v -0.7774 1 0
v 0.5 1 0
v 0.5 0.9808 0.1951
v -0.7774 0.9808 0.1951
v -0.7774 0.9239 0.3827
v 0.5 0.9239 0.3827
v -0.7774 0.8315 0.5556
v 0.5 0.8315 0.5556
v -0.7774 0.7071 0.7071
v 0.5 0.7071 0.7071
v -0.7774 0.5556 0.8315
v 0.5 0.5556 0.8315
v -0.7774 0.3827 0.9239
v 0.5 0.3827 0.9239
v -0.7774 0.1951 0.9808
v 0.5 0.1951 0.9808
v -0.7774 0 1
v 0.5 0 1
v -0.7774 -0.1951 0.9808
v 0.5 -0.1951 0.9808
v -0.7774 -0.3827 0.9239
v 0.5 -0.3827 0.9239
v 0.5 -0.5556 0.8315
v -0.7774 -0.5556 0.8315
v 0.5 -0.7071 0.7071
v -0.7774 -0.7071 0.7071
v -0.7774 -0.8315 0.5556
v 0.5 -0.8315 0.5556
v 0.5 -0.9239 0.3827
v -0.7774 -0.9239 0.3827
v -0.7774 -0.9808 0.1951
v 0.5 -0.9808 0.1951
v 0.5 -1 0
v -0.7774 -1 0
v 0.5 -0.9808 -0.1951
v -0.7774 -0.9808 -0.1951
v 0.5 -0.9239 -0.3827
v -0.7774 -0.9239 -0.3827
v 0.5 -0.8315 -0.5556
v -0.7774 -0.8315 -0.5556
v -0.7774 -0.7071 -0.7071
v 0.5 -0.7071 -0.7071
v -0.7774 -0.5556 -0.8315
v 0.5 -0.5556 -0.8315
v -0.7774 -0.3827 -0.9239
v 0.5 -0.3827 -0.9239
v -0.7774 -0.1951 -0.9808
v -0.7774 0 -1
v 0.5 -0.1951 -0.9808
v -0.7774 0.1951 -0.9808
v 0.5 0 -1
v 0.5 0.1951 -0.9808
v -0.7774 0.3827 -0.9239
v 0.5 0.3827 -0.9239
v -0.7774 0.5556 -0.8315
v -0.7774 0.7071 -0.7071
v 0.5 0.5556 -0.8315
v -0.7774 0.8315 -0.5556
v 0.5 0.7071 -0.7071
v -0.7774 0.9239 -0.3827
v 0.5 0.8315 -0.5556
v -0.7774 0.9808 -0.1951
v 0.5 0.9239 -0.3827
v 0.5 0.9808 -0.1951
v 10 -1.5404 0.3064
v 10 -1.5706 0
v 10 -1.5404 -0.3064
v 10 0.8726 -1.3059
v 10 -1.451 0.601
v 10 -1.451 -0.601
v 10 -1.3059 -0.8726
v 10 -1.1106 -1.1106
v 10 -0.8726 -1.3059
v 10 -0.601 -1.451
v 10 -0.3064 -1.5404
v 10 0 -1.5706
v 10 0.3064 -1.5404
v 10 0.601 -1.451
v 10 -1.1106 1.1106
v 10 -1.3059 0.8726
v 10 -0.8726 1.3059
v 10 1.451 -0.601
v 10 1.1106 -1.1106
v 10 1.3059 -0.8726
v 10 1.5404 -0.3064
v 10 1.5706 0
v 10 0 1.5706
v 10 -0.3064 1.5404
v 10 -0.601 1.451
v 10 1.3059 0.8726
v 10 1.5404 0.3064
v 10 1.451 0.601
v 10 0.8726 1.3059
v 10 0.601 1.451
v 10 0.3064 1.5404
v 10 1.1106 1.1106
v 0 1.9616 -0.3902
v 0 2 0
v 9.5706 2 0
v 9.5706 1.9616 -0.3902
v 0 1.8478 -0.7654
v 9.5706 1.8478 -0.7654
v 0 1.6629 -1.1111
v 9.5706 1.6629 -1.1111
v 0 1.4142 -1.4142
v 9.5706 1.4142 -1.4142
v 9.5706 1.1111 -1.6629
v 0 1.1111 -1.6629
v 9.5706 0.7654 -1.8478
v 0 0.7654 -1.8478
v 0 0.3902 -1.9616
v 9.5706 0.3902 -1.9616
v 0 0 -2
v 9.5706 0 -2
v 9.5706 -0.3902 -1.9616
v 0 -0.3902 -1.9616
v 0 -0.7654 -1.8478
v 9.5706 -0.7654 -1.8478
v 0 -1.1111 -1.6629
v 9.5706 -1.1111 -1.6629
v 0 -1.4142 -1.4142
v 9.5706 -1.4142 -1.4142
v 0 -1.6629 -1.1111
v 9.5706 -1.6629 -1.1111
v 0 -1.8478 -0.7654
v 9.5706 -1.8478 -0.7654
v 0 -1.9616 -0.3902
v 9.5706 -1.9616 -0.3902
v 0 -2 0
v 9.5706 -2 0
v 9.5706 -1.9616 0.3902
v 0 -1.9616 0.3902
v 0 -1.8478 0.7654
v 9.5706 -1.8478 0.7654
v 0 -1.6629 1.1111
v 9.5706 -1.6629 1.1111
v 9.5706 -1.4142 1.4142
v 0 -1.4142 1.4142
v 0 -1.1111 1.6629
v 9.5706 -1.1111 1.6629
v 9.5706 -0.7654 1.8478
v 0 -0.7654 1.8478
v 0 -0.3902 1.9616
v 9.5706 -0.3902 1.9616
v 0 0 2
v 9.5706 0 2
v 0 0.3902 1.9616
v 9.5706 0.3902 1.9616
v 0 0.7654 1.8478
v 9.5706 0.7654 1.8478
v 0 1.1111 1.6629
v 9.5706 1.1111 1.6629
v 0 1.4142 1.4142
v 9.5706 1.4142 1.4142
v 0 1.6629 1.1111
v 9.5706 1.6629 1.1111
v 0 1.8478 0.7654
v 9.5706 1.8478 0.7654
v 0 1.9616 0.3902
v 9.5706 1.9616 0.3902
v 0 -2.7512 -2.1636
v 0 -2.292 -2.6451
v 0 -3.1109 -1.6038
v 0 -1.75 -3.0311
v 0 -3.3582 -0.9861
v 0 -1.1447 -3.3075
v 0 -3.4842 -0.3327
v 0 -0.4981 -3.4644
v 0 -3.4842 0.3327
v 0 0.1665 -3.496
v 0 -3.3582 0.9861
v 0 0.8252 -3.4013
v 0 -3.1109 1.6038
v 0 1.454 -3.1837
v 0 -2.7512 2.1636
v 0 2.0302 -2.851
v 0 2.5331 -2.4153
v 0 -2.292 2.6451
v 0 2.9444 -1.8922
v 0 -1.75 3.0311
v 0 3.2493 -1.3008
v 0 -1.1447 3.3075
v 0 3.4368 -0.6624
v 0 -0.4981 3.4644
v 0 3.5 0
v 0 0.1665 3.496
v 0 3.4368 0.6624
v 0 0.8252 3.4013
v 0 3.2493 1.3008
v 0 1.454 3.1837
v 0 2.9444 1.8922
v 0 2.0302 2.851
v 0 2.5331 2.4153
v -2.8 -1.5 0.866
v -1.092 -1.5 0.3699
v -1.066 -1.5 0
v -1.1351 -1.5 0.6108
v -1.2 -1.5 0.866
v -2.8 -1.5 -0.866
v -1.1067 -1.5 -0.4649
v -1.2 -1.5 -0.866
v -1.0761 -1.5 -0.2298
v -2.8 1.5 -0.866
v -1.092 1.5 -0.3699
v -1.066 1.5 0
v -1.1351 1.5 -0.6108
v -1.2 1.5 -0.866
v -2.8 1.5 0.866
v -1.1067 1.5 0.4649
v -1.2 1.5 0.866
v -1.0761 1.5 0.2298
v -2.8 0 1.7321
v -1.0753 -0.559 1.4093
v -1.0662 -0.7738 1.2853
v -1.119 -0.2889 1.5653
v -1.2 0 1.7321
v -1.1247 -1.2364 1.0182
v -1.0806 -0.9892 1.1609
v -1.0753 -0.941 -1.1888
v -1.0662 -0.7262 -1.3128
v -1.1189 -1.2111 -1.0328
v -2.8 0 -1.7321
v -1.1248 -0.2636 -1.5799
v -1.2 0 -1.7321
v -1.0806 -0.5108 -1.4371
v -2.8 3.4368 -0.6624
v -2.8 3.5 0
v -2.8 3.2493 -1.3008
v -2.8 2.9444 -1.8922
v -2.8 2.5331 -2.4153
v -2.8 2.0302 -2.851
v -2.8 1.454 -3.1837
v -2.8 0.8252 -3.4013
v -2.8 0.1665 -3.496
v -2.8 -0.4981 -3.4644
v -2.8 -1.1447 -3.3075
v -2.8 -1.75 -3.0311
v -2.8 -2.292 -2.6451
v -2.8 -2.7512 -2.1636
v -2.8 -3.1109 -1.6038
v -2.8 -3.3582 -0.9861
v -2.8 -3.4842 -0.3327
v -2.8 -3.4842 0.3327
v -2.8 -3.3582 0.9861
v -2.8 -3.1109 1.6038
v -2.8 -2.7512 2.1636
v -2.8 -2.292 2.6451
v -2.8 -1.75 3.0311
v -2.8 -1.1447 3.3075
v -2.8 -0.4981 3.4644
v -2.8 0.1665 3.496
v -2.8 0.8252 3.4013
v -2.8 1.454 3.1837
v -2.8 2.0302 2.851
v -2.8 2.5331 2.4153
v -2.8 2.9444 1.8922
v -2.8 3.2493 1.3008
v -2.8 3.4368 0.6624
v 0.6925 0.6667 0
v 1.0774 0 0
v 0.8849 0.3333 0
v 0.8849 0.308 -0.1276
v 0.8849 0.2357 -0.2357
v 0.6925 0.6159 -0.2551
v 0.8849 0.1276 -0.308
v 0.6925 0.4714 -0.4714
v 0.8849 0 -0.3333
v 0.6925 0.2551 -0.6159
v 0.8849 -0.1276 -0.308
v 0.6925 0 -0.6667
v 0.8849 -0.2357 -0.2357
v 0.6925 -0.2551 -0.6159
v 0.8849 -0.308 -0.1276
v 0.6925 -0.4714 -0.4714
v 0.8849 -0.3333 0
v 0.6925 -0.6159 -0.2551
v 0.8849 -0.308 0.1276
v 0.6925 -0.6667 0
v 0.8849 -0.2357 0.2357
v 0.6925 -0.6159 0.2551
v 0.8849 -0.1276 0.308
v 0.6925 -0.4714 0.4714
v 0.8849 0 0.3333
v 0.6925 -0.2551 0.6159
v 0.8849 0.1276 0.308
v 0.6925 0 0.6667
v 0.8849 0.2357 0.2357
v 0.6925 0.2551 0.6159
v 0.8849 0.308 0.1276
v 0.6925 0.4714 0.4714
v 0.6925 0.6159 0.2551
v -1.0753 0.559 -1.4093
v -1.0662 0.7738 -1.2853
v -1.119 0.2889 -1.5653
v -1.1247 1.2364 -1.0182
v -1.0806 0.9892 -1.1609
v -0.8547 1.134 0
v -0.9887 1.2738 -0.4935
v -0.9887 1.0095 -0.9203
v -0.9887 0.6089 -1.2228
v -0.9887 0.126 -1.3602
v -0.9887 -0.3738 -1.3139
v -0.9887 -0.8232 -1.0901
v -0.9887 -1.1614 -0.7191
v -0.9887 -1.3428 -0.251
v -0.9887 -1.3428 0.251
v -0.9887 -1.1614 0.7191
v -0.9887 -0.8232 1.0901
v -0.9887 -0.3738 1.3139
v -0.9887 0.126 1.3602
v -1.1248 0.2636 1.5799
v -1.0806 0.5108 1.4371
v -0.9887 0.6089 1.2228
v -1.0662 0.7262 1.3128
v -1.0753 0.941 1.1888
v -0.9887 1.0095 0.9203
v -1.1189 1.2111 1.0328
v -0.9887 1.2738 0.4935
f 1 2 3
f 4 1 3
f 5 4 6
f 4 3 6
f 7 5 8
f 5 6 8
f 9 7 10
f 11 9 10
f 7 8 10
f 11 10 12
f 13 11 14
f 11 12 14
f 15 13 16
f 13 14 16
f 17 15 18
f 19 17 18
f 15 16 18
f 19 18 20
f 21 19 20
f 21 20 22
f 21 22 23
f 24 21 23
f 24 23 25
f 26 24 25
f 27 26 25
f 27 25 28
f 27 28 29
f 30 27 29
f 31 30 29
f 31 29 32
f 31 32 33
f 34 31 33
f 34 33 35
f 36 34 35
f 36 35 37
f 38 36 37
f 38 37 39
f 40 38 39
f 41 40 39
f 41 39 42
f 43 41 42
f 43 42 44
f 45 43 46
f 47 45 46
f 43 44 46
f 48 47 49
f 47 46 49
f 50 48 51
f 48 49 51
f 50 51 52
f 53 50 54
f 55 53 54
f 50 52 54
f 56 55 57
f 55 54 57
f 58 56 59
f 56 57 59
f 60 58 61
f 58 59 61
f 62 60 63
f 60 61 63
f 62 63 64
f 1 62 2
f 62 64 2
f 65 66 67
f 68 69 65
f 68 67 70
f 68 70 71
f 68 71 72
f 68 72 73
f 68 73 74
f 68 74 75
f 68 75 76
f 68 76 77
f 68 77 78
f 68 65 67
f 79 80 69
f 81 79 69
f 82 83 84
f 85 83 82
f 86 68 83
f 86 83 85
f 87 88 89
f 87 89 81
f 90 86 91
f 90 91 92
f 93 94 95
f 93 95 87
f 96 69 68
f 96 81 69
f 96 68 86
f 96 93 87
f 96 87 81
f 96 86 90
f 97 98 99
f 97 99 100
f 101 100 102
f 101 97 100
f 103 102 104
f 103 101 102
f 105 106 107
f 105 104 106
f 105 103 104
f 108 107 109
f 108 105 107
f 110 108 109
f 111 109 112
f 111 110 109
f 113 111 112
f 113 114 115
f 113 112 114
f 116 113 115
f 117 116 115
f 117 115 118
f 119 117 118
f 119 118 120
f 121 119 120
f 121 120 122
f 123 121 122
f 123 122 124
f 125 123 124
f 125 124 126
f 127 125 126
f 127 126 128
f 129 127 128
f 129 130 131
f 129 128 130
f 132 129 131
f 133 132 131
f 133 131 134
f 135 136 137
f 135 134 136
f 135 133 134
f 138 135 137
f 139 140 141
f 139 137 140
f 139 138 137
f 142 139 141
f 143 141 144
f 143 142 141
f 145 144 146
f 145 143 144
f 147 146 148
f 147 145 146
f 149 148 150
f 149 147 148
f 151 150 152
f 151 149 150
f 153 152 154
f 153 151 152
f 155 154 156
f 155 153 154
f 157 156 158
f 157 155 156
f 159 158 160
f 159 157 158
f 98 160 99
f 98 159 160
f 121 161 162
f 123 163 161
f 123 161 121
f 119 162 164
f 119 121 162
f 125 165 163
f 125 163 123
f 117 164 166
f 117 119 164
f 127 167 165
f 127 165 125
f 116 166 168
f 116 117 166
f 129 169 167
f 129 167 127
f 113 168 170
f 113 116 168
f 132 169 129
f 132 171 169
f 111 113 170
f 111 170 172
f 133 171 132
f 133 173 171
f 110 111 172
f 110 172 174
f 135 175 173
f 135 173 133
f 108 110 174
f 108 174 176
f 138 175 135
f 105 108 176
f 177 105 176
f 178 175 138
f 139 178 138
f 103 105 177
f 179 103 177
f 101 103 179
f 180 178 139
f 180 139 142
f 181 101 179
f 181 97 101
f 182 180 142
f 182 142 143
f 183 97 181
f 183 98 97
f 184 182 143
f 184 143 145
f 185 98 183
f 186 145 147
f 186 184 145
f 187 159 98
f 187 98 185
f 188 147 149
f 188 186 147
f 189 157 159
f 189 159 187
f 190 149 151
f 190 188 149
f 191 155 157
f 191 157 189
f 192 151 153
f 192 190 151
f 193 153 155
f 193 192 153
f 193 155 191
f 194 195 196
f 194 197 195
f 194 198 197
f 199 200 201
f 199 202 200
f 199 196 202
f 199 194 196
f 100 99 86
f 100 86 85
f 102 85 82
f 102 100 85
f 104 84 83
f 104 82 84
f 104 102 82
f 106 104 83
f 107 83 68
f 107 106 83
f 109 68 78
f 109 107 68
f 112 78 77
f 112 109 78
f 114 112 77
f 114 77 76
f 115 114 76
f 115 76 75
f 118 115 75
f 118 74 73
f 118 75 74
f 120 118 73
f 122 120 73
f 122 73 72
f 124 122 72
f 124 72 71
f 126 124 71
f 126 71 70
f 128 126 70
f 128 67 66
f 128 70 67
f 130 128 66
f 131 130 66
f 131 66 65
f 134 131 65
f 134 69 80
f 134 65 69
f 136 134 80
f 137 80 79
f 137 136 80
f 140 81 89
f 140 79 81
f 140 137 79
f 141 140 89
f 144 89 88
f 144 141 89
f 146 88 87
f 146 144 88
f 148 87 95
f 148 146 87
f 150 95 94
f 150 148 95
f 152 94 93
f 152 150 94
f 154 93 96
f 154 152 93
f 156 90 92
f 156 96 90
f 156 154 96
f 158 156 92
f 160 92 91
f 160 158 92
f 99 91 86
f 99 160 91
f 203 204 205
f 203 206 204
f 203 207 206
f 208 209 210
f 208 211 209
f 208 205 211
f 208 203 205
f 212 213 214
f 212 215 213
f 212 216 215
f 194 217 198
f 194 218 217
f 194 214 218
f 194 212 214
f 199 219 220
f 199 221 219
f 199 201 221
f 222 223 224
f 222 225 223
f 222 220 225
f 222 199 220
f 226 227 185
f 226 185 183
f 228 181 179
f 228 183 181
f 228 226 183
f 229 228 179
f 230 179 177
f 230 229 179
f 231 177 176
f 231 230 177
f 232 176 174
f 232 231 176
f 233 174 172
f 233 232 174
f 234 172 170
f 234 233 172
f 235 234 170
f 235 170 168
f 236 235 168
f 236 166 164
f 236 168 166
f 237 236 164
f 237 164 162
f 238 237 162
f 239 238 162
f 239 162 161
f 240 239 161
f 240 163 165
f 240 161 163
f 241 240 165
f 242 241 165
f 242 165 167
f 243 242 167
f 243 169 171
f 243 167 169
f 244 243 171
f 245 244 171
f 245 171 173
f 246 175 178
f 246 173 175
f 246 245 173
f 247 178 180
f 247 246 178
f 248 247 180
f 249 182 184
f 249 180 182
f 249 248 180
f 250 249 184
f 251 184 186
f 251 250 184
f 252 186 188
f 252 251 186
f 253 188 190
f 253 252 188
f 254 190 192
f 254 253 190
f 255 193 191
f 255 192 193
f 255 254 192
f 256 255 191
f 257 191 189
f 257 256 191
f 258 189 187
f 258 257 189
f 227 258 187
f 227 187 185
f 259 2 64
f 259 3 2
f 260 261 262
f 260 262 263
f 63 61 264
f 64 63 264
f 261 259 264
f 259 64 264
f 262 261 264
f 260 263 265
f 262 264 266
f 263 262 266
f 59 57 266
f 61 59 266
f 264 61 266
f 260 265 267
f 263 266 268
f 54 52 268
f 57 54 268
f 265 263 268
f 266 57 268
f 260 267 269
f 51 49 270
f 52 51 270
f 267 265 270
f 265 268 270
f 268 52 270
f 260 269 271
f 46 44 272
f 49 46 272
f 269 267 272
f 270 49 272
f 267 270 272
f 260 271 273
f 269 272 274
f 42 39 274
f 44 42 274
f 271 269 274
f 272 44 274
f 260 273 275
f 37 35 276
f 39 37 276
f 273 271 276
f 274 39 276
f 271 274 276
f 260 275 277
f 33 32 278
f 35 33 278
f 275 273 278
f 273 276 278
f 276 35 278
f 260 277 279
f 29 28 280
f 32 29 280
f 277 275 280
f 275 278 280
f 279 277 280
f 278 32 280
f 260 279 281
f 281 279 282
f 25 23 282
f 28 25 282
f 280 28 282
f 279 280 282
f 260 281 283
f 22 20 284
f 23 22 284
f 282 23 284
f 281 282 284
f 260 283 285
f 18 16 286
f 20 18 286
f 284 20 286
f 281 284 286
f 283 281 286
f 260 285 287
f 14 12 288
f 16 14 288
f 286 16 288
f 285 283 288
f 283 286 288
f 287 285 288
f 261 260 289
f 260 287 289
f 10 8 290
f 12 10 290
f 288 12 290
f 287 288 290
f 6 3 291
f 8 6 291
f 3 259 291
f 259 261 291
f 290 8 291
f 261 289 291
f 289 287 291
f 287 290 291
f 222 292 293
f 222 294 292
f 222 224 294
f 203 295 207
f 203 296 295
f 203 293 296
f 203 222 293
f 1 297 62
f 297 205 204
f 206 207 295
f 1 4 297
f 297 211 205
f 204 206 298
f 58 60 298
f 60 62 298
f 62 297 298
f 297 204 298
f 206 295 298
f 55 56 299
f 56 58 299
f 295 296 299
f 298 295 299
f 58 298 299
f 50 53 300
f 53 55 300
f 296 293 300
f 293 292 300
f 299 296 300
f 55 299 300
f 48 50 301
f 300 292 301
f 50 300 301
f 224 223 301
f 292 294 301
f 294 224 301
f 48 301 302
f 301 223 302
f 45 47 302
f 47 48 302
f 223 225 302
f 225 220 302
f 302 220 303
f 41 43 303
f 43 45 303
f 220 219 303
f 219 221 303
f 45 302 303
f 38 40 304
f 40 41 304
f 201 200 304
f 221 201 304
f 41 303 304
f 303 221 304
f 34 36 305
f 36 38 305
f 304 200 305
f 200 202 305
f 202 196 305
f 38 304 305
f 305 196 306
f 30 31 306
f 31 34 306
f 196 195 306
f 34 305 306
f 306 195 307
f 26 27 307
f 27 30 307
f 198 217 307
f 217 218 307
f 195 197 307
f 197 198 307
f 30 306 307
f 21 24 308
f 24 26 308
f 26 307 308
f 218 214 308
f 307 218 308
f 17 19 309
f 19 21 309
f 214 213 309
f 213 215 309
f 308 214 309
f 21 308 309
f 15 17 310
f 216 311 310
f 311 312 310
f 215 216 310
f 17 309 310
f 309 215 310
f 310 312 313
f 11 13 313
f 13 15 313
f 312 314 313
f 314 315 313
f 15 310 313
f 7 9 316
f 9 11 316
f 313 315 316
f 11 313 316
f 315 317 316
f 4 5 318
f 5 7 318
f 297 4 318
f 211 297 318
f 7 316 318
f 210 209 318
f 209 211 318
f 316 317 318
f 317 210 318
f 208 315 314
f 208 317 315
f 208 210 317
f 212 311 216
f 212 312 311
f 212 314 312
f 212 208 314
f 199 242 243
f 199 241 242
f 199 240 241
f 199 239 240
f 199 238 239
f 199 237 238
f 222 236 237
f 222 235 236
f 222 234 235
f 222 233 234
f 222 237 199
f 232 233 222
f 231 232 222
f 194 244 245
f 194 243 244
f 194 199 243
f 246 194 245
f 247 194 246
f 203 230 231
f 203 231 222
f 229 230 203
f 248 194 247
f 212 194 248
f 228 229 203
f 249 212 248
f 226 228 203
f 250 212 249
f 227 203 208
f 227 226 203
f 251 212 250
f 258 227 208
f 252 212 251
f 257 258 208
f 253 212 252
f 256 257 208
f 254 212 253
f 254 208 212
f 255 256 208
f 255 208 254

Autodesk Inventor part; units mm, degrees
ref_plane "YZ Plane" through (0, 0, 0) normal (1, 0, 0) x (0, 1, 0)
ref_plane "XZ Plane" through (0, 0, 0) normal (0, 1, 0) x (-1, 0, 0)
sketch "Sketch1" plane through (0, 0, 0) normal (0, 0, 1) x (1, 0, 0)
  line L0 (1.0774, 0) -> (10, 0)
  line L1 (10, 0) -> (10, 2)
  line L2 (10, 2) -> (0, 2)
  line L3 (0, 2) -> (0, 3.5)
  line L4 (0, 3.5) -> (-2.8, 3.5)
  line L5 (-2.8, 3.5) -> (-2.8, 1.7321)
  line L6 (-2.8, 1.7321) -> (-1.2, 1.7321)
  line L7 (-1.2, 1.7321) -> (-0.7774, 1)
  line L8 (-5.36, 0) -> (12.56, 0) projected
  line L9 (0, -0.7) -> (0, 4.2) projected
  line L10 (-0.7774, 1) -> (0.5, 1)
  line L11 (0.5, 1) -> (1.0774, 0)
  line L12 (-2.8, 1.7321) -> (-2.8, 0) construction
  dimension "d0" = 2.8
  dimension "d1" = 1.6
  dimension "d2" = 60
  dimension "d3" = 4
  dimension "d4" = 3.4641
  dimension "d5" = 7
  dimension "d15" = 3.3
  dimension "d16" = 2
  dimension "d17" = 10
revolve "Body" add sketch "Sketch1" angle 360 about axis through (1.0774, 0, 0) along (1, 0, 0) contours L11 L10 L9 L2 L1 L0 | L10 L7 L6 L5 L4 L3 L9
sketch "Sketch2" plane through (-2.8, 0, 0) normal (-1, 0, 0) x (0, 0, 1)
  circle A0 centre (0, 0) radius 1.7321 projected
  line L0 (0, -4.9) -> (0, 4.9) projected
  line L1 (-4.9, 0) -> (4.9, 0) projected
  line L2 (1.7321, 0) -> (0.866, -1.5)
  line L3 (0.866, -1.5) -> (-0.866, -1.5)
  line L4 (-0.866, -1.5) -> (-1.7321, 0)
  line L5 (-1.7321, 0) -> (-0.866, 1.5)
  line L6 (-0.866, 1.5) -> (0.866, 1.5)
  line L7 (0.866, 1.5) -> (1.7321, 0)
extrude "Slot" add sketch "Sketch2" against normal up to next contours L7 A0 | A0 L2 | L6 L0 A0 | A0 L0 L3 | L0 L6 A0 | A0 L3 L0 | L4 A0 | A0 L5
thread "Thread" size "M4x0.7" class "6g" standard "ISO Metric profile" length 8
chamfer "Chamfer1" distance 0.4294 distance2 0.4294 1 edges at (10, -2, 0) measured on face at (10, 0.556, 0.0273)
ref_plane "Work Plane1" through (5, 0, 0) normal (0, 0.5, 0.866) x (1, 0, 0)
equation "\"d7\" = GEL"
equation "\"d9\" = -0.5 * SPD + 0.5 * GD"
equation "\"d12\" = GUL"
equation "\"d0\" = KOH"
equation "\"d1\" = INTI"
equation "\"d3\" = GD"
equation "\"d4\" = 1.1547 * SW"
equation "\"d5\" = KOD"
equation "\"d15\" = INFT"
equation "\"d16\" = SDT"
equation "\"d17\" = NLG"
equation "\"GD\" = NND"
equation "\"NLG\" = 10"
equation "\"GEL\" = 8"
equation "\"KOD\" = 7"
equation "\"KOH\" = 2.8"
equation "\"GUL\" = 0.61345 * PTC"
equation "\"SW\" = 3"
equation "\"INTI\" = 1.6"
equation "\"SPD\" = NND - 1.2269 * PTC"
equation "\"SDT\" = 2"
equation "\"INFT\" = 3.3"
equation "\"TOA\" = 30deg"
equation "\"GD1\" = THREADDIA - 1.2269 * PTC"
equation "\"THREADDIA\" = 4"
equation "\"BDM\" = NND"
equation "\"RR\" = 0.4"
equation "\"PTC\" = 0.7"
equation "\"NND\" = 4"
equation "\"SLG\" = 2"
equation "\"GAL\" = 0.61345 * PTC"
equation "\"E0\" = 1.155 * SW"
properties part number "CNS 4557 - M4 x 10" material "Steel, Mild"
